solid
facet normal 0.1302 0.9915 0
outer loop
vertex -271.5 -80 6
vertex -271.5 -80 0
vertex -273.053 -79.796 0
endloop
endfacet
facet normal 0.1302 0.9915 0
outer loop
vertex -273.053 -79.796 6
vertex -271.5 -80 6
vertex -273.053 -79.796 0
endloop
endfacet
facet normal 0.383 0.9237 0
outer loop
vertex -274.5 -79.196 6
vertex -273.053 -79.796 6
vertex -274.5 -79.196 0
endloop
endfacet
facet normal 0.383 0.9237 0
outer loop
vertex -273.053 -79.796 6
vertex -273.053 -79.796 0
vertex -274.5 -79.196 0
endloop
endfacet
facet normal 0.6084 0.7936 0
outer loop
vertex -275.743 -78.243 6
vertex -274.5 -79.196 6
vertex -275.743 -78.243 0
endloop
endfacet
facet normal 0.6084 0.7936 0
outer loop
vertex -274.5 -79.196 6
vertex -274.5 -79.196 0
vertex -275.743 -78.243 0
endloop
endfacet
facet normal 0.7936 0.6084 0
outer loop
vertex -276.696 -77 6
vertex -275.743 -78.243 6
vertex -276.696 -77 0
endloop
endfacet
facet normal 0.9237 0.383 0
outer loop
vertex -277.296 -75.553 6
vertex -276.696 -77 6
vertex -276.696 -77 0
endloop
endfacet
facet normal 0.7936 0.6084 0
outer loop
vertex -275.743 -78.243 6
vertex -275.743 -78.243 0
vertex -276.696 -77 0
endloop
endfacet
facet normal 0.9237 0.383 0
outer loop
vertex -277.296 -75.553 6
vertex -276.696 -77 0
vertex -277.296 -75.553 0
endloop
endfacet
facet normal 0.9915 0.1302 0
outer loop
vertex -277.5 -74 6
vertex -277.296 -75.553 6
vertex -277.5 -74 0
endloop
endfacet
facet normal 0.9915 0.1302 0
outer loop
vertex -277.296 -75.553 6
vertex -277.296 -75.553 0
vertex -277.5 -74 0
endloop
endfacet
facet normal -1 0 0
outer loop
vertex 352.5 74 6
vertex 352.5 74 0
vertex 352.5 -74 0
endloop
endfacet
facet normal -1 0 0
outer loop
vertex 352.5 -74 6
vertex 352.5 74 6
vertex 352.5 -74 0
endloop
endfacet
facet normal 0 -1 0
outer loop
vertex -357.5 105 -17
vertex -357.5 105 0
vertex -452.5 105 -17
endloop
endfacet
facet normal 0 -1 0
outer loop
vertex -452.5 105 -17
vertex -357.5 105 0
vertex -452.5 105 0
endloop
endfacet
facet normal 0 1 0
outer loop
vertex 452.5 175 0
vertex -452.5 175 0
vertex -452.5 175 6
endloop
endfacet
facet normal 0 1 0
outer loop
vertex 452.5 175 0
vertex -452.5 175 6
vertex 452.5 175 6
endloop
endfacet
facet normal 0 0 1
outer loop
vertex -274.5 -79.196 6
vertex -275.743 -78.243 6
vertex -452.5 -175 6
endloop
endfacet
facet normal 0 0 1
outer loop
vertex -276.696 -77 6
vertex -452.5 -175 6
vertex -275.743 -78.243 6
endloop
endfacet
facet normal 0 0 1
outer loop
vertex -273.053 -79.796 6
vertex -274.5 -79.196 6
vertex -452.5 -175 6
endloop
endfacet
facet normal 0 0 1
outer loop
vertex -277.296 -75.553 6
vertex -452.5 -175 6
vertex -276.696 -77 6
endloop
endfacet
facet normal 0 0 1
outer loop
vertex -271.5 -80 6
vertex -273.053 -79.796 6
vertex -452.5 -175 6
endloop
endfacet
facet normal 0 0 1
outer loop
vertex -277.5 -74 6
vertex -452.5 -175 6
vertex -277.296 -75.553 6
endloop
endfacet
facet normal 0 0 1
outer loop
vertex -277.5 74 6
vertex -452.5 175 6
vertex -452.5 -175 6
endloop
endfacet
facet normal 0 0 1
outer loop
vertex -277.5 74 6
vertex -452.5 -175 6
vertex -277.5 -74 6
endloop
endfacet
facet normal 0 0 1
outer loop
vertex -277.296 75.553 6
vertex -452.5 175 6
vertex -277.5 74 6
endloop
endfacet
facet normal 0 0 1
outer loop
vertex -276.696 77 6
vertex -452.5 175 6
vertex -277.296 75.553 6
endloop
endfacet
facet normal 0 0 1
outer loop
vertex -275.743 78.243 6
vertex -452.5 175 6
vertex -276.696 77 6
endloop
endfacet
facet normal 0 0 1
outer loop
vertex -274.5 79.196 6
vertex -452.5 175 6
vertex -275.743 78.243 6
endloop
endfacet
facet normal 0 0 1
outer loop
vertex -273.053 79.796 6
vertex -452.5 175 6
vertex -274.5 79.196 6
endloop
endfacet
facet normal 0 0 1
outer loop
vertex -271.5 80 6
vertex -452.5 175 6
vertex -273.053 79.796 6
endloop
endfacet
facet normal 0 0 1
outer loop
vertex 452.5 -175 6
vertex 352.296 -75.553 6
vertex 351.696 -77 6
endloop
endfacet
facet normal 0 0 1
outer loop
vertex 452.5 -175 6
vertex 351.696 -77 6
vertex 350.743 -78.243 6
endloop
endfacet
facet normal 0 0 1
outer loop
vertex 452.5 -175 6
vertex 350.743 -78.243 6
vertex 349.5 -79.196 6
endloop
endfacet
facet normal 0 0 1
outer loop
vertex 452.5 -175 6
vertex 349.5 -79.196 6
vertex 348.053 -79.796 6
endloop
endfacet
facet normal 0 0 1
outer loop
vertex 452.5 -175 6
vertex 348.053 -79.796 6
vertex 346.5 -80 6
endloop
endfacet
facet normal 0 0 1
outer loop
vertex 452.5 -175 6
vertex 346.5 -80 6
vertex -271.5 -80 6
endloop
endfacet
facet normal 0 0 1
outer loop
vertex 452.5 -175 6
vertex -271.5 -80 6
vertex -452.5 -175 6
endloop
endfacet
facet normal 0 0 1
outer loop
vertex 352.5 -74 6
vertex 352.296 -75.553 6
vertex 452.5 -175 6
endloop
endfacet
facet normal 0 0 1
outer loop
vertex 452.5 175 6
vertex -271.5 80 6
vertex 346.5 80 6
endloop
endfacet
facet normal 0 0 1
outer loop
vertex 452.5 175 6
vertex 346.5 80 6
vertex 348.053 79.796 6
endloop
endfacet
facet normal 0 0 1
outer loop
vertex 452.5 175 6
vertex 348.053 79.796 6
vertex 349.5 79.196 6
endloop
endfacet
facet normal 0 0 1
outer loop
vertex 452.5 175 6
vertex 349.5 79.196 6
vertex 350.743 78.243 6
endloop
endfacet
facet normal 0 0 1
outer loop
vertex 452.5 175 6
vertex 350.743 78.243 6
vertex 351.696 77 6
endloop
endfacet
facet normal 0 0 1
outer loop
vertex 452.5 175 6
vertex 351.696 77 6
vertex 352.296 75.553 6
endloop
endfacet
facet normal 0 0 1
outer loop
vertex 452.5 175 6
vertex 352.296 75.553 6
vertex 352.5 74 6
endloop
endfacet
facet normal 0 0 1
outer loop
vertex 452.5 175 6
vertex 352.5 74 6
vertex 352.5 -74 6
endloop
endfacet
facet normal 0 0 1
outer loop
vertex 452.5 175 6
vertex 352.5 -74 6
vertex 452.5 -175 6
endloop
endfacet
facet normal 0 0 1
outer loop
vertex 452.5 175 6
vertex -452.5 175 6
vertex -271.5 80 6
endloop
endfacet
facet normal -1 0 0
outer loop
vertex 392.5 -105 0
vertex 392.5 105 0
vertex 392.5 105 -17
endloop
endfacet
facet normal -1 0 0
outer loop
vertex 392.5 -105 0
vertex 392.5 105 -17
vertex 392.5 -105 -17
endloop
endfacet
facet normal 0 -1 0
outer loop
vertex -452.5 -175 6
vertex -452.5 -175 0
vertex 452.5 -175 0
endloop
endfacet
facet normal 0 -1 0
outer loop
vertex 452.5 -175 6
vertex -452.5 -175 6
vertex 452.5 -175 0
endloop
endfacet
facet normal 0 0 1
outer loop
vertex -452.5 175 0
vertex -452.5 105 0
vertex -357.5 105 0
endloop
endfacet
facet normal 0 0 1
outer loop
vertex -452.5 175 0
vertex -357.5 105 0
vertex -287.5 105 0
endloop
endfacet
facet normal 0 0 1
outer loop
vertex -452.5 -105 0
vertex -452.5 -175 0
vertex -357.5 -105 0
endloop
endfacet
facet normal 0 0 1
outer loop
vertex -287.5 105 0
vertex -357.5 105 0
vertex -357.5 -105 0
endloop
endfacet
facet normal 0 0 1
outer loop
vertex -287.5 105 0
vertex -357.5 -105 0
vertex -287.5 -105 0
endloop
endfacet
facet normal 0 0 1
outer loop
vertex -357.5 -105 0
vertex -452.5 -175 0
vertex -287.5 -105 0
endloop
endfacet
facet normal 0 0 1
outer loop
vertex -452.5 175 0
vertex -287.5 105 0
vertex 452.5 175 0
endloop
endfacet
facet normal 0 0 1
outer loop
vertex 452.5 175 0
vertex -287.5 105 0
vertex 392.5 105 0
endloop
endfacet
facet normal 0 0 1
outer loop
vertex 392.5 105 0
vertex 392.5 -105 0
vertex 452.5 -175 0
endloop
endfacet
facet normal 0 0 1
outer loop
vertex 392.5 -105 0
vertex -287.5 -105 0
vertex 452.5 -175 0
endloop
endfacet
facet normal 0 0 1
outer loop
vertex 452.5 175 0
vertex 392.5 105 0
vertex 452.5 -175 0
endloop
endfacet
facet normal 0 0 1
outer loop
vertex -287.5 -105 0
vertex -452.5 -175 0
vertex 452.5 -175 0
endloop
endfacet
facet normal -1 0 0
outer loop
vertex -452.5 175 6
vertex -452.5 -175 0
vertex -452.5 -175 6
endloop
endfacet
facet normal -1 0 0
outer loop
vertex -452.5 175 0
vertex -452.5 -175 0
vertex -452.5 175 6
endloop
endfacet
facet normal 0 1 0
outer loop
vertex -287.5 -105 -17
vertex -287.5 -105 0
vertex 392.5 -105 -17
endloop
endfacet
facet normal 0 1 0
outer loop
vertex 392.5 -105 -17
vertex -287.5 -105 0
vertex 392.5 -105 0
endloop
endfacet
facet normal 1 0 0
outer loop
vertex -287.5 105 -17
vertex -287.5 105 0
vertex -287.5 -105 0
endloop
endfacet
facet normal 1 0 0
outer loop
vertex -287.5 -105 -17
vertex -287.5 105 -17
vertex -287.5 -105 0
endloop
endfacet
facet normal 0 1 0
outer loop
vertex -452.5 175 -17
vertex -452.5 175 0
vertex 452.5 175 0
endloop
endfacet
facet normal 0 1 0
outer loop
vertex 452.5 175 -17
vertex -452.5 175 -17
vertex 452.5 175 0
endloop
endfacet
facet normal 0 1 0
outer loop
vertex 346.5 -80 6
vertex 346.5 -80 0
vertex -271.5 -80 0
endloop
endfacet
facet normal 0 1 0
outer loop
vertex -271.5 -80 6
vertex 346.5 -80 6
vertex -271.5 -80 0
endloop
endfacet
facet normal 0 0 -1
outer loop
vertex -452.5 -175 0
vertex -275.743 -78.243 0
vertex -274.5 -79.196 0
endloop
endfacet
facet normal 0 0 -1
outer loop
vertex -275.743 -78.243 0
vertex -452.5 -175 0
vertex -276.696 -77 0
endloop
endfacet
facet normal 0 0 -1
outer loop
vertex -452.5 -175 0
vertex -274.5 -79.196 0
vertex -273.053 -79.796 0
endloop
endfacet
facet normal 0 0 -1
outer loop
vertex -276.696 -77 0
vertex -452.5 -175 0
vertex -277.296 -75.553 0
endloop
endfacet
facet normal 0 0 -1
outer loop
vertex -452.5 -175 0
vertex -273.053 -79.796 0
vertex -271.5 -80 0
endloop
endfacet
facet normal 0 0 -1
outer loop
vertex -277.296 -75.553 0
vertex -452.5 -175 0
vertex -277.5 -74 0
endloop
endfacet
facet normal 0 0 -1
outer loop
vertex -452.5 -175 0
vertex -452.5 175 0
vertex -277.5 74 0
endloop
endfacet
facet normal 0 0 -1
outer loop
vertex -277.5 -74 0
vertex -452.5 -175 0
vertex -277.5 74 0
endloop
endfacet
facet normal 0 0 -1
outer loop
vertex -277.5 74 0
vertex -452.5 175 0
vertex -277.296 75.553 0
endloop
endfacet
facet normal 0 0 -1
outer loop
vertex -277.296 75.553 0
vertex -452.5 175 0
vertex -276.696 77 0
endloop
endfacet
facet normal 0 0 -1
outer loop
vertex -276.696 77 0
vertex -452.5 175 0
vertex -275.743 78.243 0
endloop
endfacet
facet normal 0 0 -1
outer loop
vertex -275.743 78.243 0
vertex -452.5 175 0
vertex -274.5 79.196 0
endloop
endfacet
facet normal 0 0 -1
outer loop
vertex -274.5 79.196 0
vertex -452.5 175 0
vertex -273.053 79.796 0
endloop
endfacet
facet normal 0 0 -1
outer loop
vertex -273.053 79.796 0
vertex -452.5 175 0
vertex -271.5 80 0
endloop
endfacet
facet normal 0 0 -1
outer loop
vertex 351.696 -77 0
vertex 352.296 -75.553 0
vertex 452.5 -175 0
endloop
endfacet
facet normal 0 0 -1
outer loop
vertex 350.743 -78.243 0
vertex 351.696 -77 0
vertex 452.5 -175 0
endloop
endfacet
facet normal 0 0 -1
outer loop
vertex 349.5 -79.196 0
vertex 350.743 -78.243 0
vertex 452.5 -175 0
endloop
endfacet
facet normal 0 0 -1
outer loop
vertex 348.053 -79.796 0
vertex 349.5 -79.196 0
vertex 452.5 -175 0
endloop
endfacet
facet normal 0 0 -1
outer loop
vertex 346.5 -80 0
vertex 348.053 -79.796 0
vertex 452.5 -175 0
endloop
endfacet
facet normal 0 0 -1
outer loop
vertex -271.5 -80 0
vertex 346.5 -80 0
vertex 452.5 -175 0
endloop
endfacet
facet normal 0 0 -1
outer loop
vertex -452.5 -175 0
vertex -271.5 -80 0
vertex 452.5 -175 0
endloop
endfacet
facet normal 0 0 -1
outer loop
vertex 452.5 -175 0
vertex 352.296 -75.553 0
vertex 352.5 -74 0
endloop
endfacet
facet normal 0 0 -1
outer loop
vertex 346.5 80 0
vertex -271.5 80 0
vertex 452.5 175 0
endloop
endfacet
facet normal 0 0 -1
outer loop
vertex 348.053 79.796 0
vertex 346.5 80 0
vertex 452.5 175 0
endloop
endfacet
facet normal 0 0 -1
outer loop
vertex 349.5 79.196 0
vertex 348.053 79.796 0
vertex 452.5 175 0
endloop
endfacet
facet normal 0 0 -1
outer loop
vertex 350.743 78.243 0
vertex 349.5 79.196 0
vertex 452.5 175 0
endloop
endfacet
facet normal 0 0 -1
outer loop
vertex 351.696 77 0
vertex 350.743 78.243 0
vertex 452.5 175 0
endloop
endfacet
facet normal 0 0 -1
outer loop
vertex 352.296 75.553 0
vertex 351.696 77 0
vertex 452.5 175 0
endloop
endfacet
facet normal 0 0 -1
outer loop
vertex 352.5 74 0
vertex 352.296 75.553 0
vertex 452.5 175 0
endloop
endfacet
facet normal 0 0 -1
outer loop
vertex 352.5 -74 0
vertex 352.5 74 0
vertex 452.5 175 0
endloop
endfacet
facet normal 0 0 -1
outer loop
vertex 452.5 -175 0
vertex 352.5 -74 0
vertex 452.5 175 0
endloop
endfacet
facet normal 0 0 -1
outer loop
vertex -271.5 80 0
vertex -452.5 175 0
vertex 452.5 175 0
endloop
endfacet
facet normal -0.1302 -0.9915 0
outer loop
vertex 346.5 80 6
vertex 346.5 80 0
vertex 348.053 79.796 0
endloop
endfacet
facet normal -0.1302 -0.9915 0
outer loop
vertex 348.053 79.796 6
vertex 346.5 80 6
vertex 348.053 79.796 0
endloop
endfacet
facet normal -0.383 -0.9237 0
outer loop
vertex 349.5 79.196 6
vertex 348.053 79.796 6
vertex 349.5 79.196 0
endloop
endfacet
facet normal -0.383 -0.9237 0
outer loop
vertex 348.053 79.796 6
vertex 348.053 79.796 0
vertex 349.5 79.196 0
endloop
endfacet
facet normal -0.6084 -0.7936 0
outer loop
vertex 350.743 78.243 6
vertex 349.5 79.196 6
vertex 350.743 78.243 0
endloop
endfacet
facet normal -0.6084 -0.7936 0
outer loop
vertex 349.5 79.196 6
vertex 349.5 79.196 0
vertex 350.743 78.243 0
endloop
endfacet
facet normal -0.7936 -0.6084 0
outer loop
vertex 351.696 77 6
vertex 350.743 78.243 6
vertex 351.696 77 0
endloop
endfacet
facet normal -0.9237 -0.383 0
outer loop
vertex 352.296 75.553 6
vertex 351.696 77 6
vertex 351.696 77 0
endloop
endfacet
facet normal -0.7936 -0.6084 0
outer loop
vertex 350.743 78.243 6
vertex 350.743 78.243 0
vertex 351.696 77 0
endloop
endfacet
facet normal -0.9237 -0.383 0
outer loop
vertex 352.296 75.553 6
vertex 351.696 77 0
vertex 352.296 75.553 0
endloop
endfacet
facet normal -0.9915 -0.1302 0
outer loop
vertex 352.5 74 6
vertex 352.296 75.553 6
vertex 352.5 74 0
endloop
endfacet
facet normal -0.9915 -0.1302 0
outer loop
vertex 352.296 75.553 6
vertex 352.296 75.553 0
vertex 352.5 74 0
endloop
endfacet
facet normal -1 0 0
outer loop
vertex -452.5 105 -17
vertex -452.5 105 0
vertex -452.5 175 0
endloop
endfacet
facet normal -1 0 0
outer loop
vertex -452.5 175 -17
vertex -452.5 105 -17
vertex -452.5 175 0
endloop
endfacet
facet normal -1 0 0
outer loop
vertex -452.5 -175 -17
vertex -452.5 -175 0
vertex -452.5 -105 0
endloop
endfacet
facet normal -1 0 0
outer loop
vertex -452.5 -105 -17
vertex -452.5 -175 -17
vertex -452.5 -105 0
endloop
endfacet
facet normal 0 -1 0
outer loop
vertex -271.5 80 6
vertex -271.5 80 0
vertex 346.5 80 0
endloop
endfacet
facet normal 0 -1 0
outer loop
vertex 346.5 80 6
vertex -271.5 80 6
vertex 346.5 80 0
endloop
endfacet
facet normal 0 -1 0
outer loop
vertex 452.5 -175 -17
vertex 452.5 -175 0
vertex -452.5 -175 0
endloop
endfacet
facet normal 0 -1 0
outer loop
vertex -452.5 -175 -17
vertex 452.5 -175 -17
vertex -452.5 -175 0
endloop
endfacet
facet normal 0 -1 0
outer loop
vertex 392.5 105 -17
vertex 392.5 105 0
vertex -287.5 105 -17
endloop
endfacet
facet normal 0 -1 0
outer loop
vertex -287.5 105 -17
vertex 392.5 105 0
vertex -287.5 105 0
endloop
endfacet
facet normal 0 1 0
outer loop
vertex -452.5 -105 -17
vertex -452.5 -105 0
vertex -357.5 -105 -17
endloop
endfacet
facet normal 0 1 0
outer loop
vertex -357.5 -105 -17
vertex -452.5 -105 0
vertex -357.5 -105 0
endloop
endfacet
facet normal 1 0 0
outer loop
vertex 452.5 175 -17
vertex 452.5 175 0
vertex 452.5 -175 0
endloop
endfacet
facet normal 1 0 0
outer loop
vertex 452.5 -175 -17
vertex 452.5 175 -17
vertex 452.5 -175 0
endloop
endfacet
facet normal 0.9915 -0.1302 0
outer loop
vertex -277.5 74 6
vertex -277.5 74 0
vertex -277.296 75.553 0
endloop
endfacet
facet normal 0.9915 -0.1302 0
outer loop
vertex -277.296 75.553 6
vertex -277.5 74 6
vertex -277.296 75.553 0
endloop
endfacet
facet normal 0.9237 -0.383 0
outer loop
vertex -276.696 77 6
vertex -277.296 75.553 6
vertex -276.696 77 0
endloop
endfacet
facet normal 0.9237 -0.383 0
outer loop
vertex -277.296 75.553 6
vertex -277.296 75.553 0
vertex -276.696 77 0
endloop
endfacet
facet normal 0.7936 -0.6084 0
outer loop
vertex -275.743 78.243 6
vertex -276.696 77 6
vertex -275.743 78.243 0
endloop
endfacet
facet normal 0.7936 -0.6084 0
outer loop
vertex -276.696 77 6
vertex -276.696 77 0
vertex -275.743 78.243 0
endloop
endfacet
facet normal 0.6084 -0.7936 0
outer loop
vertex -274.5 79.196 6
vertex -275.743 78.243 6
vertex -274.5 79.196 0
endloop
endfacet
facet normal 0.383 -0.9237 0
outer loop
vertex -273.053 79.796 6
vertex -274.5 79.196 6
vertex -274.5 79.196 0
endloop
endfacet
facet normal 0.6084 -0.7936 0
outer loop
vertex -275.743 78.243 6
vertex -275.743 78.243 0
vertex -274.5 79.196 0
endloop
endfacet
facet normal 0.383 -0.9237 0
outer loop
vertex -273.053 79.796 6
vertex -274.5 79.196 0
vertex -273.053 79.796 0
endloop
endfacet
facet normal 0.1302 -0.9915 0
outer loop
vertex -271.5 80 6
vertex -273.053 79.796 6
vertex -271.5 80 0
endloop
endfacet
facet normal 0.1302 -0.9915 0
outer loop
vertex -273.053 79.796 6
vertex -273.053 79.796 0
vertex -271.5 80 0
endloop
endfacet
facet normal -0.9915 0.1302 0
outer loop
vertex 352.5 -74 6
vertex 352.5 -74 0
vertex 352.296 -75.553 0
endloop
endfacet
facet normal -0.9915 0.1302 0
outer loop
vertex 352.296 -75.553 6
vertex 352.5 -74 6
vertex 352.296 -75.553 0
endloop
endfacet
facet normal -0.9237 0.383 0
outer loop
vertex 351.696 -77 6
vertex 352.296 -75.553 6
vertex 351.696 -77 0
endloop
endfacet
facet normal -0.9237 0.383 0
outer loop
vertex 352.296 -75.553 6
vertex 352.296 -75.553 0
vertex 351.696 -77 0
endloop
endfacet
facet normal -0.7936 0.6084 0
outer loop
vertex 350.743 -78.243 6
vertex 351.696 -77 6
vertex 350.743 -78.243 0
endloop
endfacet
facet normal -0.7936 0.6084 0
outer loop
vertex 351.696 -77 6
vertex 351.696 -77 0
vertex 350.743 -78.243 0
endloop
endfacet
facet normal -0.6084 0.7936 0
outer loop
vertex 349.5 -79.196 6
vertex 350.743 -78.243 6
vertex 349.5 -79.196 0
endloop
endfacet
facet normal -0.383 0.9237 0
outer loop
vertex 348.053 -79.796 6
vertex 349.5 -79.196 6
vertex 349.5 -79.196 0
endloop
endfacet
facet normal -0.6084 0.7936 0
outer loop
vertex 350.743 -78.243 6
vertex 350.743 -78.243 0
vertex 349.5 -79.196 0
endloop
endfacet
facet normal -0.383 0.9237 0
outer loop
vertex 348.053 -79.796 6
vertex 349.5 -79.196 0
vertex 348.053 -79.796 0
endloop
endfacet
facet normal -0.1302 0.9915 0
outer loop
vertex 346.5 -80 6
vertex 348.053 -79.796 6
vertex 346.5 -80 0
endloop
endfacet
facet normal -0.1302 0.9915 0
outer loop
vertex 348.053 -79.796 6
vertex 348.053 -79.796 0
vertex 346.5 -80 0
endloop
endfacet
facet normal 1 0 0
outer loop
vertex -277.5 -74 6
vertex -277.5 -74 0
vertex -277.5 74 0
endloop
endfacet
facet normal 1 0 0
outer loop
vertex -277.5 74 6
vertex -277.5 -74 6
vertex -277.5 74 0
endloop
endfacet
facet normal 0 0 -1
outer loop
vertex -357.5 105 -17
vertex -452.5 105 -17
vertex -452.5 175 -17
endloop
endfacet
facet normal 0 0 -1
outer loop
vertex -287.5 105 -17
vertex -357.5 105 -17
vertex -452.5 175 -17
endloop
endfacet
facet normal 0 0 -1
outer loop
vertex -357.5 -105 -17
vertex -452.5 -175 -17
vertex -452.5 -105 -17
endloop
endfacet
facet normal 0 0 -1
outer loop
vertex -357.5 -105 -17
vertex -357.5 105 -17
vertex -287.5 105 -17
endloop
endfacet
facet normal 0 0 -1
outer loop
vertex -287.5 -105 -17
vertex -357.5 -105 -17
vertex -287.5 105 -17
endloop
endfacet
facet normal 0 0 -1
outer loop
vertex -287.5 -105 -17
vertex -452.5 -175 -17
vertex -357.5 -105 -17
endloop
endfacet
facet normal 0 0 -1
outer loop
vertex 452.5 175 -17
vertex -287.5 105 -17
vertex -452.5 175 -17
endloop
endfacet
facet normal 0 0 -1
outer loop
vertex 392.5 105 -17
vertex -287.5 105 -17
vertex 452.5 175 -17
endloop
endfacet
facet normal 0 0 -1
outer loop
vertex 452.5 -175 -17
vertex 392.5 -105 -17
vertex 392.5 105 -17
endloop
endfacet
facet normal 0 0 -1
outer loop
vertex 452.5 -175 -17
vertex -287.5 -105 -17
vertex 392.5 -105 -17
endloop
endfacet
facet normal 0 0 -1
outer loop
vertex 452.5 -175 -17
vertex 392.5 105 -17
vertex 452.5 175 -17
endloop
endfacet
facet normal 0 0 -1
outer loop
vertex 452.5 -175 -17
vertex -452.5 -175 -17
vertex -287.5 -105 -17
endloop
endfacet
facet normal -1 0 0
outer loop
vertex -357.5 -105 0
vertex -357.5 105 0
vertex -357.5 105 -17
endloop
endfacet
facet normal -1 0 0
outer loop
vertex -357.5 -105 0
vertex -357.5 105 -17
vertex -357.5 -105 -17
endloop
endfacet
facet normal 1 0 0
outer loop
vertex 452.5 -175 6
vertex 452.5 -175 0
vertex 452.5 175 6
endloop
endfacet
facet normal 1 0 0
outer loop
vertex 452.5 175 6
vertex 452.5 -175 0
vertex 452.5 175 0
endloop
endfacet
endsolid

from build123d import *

# Parameters (mm, degrees)
F0_W     = 905
F0_H     = 350
F1_DEPTH = 6
F2_W     = 60
F2_H     = 210
F2_W_2   = 70
F3_DEPTH = 17


# Not quite as in the source:
# - a feature of the source that left no trace in its solid (it failed there, or was rolled back) is left out


with BuildPart() as f1:
    # F0 (on Top) → F1 (new body)
    with BuildSketch(Plane.XY):
        Rectangle(F0_W, F0_H)
        with BuildLine():
            ThreePointArc((-277.5, 74), (-275.7426406871, 78.2426406871), (-271.5, 80))
            Line((-271.5, 80), (346.5, 80))
            ThreePointArc((346.5, 80), (350.7426406871, 78.2426406871), (352.5, 74))
            Line((352.5, 74), (352.5, -74))
            ThreePointArc((352.5, -74), (350.7426406871, -78.2426406871), (346.5, -80))
            Line((346.5, -80), (-271.5, -80))
            ThreePointArc((-271.5, -80), (-275.7426406871, -78.2426406871), (-277.5, -74))
            Line((-277.5, -74), (-277.5, 74))
        make_face(mode=Mode.SUBTRACT)
    extrude(amount=F1_DEPTH)


with BuildPart() as f3:
    # F2 (on face) → F3 (new body)
    with BuildSketch(Plane(origin=(0, 0, 0), x_dir=(1, 0, 0), z_dir=(0, 0, -1))):
        with Locations((422.5, 0)):
            Rectangle(F2_W, F2_H)
        Polygon((452.5, 175), (-452.5, 175), (-452.5, 105), (-357.5, 105), (-287.5, 105), (392.5, 105), (452.5, 105), align=None)
        Polygon((-357.5, -105), (-452.5, -105), (-452.5, -175), (452.5, -175), (452.5, -105), (392.5, -105), (-287.5, -105), align=None)
        with Locations((-322.5, 0)):
            Rectangle(F2_W_2, F2_H)
    extrude(amount=F3_DEPTH)


solid = Compound([f1.part, f3.part])
